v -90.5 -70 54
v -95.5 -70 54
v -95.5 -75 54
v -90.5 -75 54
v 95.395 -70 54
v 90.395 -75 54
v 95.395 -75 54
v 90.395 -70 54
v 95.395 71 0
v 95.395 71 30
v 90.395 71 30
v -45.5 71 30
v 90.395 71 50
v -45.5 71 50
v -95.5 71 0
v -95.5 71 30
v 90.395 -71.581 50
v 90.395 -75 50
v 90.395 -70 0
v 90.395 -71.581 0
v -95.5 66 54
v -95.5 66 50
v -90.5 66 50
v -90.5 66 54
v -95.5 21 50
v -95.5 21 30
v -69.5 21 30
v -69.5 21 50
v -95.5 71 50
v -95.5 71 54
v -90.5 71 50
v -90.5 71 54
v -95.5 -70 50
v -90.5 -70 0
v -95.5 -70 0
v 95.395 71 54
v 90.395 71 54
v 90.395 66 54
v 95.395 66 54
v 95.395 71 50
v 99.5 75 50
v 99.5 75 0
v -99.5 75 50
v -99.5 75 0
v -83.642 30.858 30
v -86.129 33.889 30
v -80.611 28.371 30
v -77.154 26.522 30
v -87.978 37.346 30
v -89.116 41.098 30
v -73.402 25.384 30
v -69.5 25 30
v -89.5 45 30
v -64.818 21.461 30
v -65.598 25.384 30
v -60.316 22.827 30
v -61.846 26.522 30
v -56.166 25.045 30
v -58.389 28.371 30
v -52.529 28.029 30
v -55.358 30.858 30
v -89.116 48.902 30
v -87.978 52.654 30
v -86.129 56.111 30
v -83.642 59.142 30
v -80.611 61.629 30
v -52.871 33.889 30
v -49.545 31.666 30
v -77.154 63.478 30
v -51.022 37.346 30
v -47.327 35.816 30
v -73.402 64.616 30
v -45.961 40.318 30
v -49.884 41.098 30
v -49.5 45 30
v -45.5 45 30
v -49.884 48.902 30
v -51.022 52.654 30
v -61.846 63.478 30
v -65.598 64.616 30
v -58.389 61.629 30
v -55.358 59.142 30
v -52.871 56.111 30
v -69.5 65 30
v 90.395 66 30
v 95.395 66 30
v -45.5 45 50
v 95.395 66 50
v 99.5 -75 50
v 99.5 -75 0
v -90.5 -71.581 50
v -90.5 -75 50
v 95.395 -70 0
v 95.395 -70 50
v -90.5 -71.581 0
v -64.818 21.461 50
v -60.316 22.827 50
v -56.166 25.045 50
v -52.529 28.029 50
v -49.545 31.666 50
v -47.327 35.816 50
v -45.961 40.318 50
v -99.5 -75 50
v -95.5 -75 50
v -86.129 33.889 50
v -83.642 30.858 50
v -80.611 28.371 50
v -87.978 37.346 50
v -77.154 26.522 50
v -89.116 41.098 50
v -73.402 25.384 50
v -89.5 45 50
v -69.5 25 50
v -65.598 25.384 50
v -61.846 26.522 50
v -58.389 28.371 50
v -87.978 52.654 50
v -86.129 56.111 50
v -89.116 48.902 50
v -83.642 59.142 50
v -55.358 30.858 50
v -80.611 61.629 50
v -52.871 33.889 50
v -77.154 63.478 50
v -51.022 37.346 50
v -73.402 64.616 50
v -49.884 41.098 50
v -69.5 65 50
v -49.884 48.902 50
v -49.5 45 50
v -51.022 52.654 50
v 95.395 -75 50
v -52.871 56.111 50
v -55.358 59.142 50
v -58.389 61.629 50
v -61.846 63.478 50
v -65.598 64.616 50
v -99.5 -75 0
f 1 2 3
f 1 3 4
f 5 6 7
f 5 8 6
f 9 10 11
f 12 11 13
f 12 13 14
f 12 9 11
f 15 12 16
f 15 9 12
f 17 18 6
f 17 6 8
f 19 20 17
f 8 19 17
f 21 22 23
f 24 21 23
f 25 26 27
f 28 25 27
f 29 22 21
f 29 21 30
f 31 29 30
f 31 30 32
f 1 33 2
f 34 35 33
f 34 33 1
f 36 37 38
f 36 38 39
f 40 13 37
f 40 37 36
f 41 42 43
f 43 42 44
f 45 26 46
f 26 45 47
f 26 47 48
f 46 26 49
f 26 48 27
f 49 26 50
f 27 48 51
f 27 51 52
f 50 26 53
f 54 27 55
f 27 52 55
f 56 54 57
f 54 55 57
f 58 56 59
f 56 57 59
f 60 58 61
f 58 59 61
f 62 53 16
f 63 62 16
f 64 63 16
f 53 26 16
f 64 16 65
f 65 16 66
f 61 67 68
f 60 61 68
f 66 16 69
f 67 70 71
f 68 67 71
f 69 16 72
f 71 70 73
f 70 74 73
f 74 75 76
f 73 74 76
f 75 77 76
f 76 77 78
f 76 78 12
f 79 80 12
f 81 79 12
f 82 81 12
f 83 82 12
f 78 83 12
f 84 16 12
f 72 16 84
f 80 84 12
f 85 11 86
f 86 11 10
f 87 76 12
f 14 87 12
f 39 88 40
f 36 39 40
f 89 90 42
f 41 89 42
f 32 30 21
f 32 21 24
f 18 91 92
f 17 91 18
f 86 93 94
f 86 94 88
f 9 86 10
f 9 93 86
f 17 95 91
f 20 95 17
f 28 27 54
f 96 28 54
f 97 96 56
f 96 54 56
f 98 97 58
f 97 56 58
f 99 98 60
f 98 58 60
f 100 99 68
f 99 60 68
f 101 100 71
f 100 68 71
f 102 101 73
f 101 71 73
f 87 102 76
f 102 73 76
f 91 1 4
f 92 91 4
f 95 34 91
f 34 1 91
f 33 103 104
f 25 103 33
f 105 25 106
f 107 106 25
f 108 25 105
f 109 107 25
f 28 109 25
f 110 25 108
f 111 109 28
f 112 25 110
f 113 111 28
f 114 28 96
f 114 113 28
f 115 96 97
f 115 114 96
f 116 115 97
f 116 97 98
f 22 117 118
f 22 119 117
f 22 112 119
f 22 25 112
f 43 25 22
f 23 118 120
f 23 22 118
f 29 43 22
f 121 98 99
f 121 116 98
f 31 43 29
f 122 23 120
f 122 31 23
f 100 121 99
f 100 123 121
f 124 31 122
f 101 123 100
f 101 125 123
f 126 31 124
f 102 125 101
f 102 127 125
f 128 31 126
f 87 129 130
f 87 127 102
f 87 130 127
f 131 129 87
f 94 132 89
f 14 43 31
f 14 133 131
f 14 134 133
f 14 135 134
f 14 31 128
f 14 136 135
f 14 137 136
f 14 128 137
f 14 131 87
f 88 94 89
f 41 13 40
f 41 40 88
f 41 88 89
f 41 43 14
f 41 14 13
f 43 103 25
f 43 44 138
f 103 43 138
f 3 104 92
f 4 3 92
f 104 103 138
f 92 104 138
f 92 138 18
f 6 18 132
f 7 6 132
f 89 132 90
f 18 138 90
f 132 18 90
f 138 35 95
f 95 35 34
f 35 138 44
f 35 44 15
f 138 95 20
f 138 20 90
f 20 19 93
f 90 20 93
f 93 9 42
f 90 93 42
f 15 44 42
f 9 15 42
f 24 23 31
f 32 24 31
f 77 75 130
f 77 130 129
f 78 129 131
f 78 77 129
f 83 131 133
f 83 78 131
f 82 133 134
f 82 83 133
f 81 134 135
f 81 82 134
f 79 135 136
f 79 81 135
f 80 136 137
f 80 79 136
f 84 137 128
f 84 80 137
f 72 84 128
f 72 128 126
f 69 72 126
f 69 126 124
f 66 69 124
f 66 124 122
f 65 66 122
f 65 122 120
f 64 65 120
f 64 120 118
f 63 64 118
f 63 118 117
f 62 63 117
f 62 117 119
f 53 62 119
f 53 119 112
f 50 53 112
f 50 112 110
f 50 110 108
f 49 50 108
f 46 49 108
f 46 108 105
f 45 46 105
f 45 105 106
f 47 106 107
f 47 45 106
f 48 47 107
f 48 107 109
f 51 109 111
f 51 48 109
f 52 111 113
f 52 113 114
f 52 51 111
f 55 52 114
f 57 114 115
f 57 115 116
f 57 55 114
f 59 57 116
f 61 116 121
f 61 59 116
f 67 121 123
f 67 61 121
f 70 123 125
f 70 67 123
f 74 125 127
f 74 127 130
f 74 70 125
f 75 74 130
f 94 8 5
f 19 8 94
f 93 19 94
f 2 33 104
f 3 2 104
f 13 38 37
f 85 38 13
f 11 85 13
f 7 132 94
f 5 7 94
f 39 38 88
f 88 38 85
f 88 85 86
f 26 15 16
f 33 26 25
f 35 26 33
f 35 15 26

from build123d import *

# Parameters (mm, degrees)
F3_DEPTH = 6
F4_DEPTH = 50
F1_W     = 5
F1_H     = 5
F6_DEPTH = 54
F7_DEPTH = 54
F2_R     = 20
F8_DEPTH = 50
F9_DEPTH = 30


with BuildPart() as f3:
    # F2 (on Top) → F3 (new body)
    with BuildSketch(Plane.XY):
        with BuildLine():
            Line((-45.5, 75), (-99.5, 75))
            Line((-99.5, 75), (-99.5, 21))
            Line((-99.5, 21), (-69.5, 21))
            ThreePointArc((-69.5, 21), (-86.470563, 61.970563), (-45.5, 45))
            Line((-45.5, 45), (-45.5, 75))
        make_face()
        with BuildLine():
            Line((-20, 75), (-45.5, 75))
            Line((-45.5, 75), (-45.5, 45))
            ThreePointArc((-45.5, 45), (-52.529437, 28.029437), (-69.5, 21))
            Line((-69.5, 21), (-99.5, 21))
            Line((-99.5, 21), (-99.5, -75))
            Line((-99.5, -75), (99.5, -75))
            Line((99.5, -75), (99.5, 75))
            Line((99.5, 75), (20, 75))
            Line((20, 75), (-20, 75))
        make_face()
    extrude(amount=F3_DEPTH)

    # F1 (on Top) → F4 (join)
    with BuildSketch(Plane.XY):
        Polygon((99.5, 75), (-99.5, 75), (-99.5, -75), (-95.5, -75), (-95.5, -70), (-95.5, 66), (-95.5, 71), (-90.5, 71), (0, 71), (90.394951, 71), (95.394951, 71), (95.394951, 66), (95.394951, -70), (95.394951, -75), (99.5, -75), align=None)
        Polygon((-95.5, -70), (-95.5, -75), (-90.5, -75), (-90.5, -71.581401), (-90.5, -70), align=None)
        Polygon((90.394951, -75), (95.394951, -75), (95.394951, -70), (90.394951, -70), (90.394951, -71.581401), align=None)
        Polygon((-90.5, -71.581401), (-90.5, -75), (0, -75), (90.394951, -75), (90.394951, -71.581401), align=None)
    extrude(amount=F4_DEPTH)

    # F1 (on Top) → F6 (join)
    with BuildSketch(Plane.XY):
        with Locations((-93, 68.5)):
            Rectangle(F1_W, F1_H)
    extrude(amount=F6_DEPTH)

    # F1 (on Top) → F7 (join)
    with BuildSketch(Plane.XY):
        with Locations((92.894951, 68.5)):
            Rectangle(F1_W, F1_H)
        Polygon((90.394951, -75), (95.394951, -75), (95.394951, -70), (90.394951, -70), (90.394951, -71.581401), align=None)
        Polygon((-95.5, -70), (-95.5, -75), (-90.5, -75), (-90.5, -71.581401), (-90.5, -70), align=None)
    extrude(amount=F7_DEPTH)

    # F2 (on Top) → F8 (join)
    with BuildSketch(Plane.XY):
        with BuildLine():
            ThreePointArc((-69.5, 21), (-52.529437, 28.029437), (-45.5, 45))
            ThreePointArc((-45.5, 45), (-86.470563, 61.970563), (-69.5, 21))
        make_face()
        with Locations((-69.5, 45)):
            Circle(F2_R, mode=Mode.SUBTRACT)
        with BuildLine():
            Line((-45.5, 75), (-99.5, 75))
            Line((-99.5, 75), (-99.5, 21))
            Line((-99.5, 21), (-69.5, 21))
            ThreePointArc((-69.5, 21), (-86.470563, 61.970563), (-45.5, 45))
            Line((-45.5, 45), (-45.5, 75))
        make_face()
    extrude(amount=F8_DEPTH)

    # F1 (on Top) → F9 (cut)
    with BuildSketch(Plane.XY):
        Polygon((-95.5, 66), (-95.5, -70), (-90.5, -70), (-90.5, -71.581401), (90.394951, -71.581401), (90.394951, -70), (95.394951, -70), (95.394951, 66), (90.394951, 66), (90.394951, 71), (0, 71), (-90.5, 71), (-90.5, 66), align=None)
        with Locations((-93, 68.5)):
            Rectangle(F1_W, F1_H)
        with Locations((92.894951, 68.5)):
            Rectangle(F1_W, F1_H)
    extrude(amount=F9_DEPTH, mode=Mode.SUBTRACT)


solid = f3.part
